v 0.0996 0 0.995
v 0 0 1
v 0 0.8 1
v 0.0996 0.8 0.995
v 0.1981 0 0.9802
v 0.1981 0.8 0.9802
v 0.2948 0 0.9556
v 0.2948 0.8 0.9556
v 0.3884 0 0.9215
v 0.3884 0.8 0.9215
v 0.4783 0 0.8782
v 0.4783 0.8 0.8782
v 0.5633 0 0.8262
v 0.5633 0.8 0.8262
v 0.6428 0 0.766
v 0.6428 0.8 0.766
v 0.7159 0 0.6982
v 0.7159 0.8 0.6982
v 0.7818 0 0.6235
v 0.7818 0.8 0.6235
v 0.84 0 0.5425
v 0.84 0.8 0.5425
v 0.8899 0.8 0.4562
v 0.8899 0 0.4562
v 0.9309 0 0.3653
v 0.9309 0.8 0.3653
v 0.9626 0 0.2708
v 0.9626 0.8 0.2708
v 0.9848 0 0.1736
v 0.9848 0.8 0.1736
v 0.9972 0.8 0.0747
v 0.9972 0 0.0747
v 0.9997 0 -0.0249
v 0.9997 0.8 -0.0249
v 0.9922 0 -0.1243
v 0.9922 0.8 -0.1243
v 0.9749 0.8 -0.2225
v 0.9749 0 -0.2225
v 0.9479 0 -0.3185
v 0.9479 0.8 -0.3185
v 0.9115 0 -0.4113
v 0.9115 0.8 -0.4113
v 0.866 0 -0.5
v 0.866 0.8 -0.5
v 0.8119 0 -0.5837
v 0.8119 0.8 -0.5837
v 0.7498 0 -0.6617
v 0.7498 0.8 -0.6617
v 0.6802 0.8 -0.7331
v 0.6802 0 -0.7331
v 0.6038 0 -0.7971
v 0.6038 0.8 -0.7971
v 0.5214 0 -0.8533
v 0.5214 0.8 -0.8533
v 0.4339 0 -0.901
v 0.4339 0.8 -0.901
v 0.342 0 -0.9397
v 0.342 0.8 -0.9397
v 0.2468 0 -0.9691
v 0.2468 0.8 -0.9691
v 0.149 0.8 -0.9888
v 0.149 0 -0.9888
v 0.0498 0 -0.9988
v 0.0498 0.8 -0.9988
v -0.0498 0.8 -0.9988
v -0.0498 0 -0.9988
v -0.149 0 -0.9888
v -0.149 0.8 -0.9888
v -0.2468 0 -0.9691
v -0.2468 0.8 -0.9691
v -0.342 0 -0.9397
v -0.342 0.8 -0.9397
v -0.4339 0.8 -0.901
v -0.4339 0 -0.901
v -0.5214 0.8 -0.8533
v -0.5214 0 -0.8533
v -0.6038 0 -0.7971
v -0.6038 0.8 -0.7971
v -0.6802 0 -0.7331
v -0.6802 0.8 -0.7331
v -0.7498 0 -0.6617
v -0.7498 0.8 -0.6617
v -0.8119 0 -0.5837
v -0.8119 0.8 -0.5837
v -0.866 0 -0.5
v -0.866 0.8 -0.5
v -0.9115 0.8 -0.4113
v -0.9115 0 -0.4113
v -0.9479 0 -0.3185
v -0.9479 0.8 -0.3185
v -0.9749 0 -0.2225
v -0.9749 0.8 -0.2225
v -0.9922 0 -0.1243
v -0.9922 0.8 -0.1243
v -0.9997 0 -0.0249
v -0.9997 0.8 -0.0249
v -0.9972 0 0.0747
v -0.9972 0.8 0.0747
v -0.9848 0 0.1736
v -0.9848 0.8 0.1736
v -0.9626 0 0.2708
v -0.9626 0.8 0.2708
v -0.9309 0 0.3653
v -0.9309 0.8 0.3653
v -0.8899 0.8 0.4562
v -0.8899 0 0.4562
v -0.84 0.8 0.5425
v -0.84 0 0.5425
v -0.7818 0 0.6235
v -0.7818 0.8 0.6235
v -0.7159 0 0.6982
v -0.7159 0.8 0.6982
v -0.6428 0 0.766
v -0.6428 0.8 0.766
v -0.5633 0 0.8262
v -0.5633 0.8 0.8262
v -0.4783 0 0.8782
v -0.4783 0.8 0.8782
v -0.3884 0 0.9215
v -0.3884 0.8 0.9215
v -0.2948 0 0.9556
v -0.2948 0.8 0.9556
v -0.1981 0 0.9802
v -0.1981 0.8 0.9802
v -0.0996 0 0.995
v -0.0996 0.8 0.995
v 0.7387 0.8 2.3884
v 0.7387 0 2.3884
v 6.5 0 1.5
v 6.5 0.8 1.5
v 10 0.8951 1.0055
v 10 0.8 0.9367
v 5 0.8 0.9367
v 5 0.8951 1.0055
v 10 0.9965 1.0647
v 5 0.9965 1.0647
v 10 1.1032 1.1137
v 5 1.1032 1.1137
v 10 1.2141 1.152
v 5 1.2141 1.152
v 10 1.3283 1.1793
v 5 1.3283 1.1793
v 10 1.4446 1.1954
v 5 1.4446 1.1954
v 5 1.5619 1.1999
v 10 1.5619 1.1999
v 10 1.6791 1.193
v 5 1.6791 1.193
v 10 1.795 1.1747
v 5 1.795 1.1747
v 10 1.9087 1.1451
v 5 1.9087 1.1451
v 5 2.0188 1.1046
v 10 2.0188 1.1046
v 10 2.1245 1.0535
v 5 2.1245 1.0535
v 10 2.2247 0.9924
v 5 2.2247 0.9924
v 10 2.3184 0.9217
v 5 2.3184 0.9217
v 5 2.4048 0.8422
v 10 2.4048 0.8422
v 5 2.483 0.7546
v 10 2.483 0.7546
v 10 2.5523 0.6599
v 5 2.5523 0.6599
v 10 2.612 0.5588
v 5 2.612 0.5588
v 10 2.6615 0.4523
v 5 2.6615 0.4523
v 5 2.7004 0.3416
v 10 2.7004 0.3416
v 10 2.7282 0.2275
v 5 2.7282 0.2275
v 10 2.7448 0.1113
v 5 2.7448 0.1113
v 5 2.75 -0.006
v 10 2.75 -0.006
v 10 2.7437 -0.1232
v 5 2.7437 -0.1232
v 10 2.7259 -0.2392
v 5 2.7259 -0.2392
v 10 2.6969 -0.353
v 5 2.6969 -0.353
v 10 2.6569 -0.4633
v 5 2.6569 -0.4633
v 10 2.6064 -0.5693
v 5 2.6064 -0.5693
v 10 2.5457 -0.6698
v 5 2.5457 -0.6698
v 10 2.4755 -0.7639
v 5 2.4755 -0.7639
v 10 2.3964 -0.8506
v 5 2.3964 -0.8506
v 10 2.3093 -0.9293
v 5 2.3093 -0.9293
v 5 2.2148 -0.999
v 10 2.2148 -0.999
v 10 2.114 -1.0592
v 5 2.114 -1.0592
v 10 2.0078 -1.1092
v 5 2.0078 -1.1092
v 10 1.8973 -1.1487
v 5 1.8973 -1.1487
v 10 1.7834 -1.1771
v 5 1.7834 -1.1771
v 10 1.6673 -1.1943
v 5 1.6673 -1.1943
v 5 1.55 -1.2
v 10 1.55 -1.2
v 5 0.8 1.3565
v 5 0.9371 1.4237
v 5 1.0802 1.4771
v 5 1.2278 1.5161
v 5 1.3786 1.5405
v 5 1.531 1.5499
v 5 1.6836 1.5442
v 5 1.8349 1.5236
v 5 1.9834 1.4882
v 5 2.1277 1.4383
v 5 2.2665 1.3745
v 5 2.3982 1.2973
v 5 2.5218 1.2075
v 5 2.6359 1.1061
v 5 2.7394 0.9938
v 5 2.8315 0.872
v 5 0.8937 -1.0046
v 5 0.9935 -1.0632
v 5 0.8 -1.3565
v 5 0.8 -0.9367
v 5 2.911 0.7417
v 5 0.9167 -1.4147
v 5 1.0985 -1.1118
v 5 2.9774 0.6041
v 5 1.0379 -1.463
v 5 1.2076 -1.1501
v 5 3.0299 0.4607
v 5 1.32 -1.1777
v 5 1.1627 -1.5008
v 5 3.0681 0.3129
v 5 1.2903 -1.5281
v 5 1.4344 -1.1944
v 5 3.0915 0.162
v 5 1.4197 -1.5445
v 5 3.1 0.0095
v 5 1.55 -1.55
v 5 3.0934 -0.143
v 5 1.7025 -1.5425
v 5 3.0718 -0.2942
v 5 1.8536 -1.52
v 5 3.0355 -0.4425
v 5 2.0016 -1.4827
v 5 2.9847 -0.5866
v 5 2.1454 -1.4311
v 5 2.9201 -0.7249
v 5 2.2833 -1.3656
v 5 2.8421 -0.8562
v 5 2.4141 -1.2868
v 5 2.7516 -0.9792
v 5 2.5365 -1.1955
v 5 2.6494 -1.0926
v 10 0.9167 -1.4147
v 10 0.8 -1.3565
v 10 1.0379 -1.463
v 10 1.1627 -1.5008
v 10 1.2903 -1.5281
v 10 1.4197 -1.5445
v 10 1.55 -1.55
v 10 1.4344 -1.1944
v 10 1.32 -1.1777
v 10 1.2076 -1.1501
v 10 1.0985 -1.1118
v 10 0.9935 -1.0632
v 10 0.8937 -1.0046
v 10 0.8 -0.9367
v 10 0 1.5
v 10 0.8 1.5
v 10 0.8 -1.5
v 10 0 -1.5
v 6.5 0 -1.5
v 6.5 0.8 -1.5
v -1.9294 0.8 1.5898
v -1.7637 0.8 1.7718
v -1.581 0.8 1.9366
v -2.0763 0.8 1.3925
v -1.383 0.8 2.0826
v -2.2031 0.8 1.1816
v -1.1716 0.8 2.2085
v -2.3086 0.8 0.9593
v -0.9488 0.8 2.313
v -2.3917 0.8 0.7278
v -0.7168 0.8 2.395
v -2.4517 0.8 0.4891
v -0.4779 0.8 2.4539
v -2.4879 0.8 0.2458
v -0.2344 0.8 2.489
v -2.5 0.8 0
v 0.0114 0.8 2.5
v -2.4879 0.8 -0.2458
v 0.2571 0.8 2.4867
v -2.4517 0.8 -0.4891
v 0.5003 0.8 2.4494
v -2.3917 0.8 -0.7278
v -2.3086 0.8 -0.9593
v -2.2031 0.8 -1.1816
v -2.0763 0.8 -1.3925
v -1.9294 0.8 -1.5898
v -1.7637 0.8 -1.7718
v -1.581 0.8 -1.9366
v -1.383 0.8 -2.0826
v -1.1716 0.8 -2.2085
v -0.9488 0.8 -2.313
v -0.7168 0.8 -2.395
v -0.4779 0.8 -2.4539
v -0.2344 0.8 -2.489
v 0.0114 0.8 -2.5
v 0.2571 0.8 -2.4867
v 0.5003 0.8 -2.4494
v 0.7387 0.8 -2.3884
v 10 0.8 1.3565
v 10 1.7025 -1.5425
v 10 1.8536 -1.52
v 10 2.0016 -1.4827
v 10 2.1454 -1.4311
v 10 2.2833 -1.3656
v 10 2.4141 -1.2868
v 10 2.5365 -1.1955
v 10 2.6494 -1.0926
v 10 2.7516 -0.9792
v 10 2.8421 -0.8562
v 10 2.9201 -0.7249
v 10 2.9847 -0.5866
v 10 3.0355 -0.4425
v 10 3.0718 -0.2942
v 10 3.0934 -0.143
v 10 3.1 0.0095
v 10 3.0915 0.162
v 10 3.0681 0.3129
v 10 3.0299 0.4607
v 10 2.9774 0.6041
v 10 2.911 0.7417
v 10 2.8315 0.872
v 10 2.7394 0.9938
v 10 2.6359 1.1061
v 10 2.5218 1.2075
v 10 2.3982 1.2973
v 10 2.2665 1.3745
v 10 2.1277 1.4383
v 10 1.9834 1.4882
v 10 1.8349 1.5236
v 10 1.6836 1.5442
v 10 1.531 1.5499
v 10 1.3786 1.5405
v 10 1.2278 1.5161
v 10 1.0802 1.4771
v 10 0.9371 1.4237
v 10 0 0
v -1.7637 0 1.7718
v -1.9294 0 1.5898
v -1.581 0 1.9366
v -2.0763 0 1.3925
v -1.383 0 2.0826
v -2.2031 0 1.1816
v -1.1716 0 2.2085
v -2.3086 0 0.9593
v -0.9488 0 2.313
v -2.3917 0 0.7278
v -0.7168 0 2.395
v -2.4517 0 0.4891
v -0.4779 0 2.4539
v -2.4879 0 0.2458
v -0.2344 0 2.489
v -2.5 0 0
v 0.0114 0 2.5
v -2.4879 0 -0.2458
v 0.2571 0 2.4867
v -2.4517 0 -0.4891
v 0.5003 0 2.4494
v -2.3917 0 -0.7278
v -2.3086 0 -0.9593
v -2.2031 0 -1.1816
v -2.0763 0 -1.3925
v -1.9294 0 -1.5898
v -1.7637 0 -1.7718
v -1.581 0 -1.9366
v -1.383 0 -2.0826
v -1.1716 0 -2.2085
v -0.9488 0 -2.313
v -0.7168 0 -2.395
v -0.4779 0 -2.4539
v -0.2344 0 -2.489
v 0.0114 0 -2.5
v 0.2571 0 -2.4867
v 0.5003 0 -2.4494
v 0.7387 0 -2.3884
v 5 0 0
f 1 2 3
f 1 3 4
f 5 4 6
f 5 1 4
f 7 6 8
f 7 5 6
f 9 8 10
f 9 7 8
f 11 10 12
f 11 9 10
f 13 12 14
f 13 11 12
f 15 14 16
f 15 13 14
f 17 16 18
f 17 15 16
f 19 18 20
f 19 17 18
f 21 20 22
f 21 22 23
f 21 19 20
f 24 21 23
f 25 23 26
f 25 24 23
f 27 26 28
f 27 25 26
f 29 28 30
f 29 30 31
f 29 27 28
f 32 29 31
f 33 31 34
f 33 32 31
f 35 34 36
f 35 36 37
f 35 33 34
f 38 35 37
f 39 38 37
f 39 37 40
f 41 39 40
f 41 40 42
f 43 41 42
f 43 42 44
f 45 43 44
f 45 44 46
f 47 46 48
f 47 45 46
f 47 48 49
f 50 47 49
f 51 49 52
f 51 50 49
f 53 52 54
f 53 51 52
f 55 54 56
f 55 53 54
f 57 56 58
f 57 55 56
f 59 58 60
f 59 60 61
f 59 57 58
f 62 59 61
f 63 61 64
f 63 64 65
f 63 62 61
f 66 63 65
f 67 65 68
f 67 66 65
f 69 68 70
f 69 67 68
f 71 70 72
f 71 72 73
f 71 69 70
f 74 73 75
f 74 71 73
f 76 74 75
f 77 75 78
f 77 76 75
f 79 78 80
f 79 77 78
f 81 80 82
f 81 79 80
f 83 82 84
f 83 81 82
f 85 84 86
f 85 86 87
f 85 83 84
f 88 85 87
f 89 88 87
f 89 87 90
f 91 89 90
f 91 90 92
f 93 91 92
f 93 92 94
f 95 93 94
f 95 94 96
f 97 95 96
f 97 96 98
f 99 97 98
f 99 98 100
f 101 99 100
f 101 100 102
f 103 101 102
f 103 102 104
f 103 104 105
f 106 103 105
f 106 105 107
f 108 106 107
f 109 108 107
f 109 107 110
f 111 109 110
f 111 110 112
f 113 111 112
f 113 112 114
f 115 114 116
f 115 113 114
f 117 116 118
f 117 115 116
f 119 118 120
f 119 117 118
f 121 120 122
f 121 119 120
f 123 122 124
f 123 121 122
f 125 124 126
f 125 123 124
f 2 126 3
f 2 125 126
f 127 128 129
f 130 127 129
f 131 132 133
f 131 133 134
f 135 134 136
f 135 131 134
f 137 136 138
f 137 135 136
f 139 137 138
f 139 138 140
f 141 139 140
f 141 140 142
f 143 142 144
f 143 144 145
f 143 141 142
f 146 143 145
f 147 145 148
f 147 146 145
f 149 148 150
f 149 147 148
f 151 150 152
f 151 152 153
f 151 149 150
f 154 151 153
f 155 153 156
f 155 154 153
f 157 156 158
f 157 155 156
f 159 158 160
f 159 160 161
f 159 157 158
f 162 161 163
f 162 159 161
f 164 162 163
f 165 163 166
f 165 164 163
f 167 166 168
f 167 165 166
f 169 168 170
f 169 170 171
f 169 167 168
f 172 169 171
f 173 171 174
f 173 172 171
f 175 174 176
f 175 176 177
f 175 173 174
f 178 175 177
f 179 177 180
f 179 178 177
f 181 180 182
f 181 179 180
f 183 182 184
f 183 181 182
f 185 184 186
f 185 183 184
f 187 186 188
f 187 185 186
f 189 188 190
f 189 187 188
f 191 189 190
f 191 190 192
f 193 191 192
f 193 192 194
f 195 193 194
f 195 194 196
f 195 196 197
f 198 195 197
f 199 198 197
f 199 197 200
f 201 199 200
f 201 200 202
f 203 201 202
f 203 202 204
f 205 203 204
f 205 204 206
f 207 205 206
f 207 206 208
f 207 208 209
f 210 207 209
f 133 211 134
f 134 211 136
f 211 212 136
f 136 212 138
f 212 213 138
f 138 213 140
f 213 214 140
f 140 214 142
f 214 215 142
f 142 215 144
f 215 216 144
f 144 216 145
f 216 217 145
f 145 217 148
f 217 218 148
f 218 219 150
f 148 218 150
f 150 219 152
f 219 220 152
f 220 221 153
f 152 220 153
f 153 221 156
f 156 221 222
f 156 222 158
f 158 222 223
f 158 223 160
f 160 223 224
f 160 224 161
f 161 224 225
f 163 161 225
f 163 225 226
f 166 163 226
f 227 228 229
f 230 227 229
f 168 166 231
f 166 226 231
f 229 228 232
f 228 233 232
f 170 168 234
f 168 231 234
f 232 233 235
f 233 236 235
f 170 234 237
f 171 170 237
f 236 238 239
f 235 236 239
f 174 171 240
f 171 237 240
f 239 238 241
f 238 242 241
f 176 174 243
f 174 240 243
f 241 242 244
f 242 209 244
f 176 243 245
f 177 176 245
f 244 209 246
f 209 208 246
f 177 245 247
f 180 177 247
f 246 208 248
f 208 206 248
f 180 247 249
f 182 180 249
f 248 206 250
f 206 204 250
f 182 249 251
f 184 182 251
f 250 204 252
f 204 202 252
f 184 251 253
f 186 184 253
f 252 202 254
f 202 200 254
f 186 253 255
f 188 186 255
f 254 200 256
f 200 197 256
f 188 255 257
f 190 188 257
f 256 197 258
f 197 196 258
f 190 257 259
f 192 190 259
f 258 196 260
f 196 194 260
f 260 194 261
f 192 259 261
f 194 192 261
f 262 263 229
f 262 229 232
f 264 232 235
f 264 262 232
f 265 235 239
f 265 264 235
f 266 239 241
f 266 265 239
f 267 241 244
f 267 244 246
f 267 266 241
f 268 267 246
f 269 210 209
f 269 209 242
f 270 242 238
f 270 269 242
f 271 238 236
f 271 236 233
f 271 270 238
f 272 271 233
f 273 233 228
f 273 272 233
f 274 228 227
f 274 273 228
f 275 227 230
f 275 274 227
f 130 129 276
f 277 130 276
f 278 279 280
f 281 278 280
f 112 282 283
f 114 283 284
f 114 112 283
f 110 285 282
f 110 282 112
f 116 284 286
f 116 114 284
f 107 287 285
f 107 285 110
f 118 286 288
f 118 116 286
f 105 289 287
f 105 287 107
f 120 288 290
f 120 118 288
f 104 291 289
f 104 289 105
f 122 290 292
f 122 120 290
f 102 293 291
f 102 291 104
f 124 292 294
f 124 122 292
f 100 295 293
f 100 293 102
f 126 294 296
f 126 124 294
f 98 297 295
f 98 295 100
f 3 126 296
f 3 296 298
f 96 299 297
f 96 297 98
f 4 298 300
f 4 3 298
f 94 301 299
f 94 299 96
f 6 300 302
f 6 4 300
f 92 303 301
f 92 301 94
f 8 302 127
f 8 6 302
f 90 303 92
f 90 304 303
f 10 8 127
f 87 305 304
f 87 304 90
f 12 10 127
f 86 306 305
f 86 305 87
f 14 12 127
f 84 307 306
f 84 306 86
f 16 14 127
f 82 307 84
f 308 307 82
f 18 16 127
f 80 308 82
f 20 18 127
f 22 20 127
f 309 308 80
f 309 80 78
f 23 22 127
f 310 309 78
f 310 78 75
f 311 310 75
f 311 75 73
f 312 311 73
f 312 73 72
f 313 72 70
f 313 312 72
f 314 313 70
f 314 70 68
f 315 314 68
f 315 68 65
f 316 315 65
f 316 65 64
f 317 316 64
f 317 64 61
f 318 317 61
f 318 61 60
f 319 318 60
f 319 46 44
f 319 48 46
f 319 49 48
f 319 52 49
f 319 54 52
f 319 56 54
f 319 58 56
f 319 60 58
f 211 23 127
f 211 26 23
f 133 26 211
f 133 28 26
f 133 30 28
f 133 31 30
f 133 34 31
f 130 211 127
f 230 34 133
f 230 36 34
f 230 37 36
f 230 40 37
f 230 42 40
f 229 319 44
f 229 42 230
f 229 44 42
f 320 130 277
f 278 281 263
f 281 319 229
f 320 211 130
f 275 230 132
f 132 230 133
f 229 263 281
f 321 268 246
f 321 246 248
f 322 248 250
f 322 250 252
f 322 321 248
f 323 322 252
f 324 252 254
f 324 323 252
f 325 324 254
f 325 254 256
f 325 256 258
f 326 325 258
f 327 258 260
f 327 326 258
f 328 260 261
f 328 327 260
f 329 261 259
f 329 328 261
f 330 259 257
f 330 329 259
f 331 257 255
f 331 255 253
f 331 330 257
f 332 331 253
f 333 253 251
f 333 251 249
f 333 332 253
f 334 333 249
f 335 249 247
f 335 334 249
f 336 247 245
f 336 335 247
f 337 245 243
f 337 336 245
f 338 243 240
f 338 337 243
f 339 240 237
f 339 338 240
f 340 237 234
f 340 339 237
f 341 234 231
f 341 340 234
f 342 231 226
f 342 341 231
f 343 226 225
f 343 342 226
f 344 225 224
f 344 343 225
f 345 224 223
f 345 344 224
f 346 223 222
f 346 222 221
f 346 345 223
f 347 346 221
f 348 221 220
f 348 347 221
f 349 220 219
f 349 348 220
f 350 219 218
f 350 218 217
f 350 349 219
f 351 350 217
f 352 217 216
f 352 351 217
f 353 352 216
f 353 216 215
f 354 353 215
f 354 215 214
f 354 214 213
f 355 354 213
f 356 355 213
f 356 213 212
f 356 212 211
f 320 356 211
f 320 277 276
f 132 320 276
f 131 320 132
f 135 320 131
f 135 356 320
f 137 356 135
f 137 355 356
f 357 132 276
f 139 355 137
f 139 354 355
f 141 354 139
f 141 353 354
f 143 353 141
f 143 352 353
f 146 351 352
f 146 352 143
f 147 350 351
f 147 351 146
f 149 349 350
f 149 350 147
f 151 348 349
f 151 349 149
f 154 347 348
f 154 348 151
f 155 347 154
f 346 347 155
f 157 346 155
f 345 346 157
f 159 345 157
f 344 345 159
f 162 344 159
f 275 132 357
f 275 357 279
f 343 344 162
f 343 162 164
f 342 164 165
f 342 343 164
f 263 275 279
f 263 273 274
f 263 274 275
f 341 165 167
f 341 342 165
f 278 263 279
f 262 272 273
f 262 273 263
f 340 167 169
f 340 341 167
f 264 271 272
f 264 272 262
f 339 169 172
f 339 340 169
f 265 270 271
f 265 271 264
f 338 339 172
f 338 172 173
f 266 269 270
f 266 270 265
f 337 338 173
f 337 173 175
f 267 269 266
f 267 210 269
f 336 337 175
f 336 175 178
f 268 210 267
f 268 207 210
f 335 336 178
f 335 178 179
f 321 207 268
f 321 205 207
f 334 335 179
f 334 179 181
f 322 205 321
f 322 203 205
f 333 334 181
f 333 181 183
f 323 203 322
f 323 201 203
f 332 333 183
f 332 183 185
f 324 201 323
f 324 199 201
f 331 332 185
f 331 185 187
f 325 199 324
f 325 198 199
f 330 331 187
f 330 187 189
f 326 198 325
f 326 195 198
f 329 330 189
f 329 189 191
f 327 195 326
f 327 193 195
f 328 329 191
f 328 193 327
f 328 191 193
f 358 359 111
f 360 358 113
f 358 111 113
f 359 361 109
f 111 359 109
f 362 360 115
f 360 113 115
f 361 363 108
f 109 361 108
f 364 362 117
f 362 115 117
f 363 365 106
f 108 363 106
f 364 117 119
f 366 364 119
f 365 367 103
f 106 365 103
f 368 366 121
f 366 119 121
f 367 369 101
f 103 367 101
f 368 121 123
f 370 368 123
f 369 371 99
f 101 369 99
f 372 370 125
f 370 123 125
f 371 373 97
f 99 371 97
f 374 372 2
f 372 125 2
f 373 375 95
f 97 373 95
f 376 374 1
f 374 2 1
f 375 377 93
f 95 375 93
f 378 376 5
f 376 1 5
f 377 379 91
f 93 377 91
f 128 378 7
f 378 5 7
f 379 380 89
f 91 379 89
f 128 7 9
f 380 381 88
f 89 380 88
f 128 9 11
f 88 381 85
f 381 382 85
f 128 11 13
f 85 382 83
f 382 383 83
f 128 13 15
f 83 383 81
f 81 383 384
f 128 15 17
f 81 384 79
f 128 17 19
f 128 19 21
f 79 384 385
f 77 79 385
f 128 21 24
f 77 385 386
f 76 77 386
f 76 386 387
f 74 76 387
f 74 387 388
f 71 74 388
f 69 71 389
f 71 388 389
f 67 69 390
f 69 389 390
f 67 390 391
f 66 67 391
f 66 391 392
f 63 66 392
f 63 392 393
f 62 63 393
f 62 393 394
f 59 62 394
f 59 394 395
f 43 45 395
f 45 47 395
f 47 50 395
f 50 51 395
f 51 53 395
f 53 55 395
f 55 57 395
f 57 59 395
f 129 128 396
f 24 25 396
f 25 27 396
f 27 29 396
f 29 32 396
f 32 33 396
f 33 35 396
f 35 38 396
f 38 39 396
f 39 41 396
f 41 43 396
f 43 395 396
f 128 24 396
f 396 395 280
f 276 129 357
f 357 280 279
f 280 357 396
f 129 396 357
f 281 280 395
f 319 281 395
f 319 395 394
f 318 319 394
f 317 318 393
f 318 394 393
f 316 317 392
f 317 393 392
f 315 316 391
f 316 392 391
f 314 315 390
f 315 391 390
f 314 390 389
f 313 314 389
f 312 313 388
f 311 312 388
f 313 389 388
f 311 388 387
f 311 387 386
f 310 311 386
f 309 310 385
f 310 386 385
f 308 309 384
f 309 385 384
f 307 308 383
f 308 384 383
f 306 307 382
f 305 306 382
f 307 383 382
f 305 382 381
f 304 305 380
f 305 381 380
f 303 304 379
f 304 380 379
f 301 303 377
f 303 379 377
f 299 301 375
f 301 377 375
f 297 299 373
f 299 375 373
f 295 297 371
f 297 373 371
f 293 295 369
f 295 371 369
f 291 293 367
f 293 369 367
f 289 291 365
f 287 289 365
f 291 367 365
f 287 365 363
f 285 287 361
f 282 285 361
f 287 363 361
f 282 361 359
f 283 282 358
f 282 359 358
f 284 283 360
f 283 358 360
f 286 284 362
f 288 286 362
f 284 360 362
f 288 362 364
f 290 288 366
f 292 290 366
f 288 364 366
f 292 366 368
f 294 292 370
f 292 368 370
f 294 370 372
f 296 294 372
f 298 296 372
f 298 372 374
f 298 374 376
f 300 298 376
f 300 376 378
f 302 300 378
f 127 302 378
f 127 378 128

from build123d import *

# Parameters (mm, degrees)
SKETCH1_R           = 1
BOSS_EXTRUDE1_DEPTH = 0.8
BOSS_EXTRUDE4_DEPTH = 5


with BuildPart() as part:
    # Sketch1 → Boss-Extrude1 (new body)
    with BuildSketch(Plane(origin=(0, 0, 0), x_dir=(1, 0, 0), z_dir=(0, 1, 0))):
        with BuildLine():
            Line((6.5, 1.5), (0.738689027, 2.388375708))
            ThreePointArc((0.738689027, 2.388375708), (-2.5, 0), (0.738689027, -2.388375708))
            Line((0.738689027, -2.388375708), (6.5, -1.5))
            Line((6.5, -1.5), (10, -1.5))
            Line((10, -1.5), (10, 1.5))
            Line((10, 1.5), (6.5, 1.5))
        make_face()
        with Locations(Location((0, 0, 0), (0, 0, 270))):
            Circle(SKETCH1_R, mode=Mode.SUBTRACT)
    extrude(amount=BOSS_EXTRUDE1_DEPTH)

    # Sketch5 → Boss-Extrude4 (add)
    with BuildSketch(Plane(origin=(10, 0, 0), x_dir=(0, 0, -1), z_dir=(1, 0, 0))):
        with BuildLine():
            ThreePointArc((1.356465997, 0.8), (1.500836816, 1.162716057), (1.55, 1.55))
            ThreePointArc((1.55, 1.55), (-0.387283943, 3.050836816), (-1.356465997, 0.8))
            Line((-1.356465997, 0.8), (-0.9367497, 0.8))
            ThreePointArc((-0.9367497, 0.8), (-0.397429466, 2.682276388), (1.2, 1.55))
            ThreePointArc((1.2, 1.55), (1.132276388, 1.152570534), (0.9367497, 0.8))
            Line((0.9367497, 0.8), (1.356465997, 0.8))
        make_face()
        with BuildLine():
            Line((-0.9367497, 0.8), (-1.356465997, 0.8))
            ThreePointArc((-1.356465997, 0.8), (0, 0), (1.356465997, 0.8))
            Line((1.356465997, 0.8), (0.9367497, 0.8))
            ThreePointArc((0.9367497, 0.8), (0, 0.35), (-0.9367497, 0.8))
        make_face()
    extrude(amount=-BOSS_EXTRUDE4_DEPTH)


solid = part.part
